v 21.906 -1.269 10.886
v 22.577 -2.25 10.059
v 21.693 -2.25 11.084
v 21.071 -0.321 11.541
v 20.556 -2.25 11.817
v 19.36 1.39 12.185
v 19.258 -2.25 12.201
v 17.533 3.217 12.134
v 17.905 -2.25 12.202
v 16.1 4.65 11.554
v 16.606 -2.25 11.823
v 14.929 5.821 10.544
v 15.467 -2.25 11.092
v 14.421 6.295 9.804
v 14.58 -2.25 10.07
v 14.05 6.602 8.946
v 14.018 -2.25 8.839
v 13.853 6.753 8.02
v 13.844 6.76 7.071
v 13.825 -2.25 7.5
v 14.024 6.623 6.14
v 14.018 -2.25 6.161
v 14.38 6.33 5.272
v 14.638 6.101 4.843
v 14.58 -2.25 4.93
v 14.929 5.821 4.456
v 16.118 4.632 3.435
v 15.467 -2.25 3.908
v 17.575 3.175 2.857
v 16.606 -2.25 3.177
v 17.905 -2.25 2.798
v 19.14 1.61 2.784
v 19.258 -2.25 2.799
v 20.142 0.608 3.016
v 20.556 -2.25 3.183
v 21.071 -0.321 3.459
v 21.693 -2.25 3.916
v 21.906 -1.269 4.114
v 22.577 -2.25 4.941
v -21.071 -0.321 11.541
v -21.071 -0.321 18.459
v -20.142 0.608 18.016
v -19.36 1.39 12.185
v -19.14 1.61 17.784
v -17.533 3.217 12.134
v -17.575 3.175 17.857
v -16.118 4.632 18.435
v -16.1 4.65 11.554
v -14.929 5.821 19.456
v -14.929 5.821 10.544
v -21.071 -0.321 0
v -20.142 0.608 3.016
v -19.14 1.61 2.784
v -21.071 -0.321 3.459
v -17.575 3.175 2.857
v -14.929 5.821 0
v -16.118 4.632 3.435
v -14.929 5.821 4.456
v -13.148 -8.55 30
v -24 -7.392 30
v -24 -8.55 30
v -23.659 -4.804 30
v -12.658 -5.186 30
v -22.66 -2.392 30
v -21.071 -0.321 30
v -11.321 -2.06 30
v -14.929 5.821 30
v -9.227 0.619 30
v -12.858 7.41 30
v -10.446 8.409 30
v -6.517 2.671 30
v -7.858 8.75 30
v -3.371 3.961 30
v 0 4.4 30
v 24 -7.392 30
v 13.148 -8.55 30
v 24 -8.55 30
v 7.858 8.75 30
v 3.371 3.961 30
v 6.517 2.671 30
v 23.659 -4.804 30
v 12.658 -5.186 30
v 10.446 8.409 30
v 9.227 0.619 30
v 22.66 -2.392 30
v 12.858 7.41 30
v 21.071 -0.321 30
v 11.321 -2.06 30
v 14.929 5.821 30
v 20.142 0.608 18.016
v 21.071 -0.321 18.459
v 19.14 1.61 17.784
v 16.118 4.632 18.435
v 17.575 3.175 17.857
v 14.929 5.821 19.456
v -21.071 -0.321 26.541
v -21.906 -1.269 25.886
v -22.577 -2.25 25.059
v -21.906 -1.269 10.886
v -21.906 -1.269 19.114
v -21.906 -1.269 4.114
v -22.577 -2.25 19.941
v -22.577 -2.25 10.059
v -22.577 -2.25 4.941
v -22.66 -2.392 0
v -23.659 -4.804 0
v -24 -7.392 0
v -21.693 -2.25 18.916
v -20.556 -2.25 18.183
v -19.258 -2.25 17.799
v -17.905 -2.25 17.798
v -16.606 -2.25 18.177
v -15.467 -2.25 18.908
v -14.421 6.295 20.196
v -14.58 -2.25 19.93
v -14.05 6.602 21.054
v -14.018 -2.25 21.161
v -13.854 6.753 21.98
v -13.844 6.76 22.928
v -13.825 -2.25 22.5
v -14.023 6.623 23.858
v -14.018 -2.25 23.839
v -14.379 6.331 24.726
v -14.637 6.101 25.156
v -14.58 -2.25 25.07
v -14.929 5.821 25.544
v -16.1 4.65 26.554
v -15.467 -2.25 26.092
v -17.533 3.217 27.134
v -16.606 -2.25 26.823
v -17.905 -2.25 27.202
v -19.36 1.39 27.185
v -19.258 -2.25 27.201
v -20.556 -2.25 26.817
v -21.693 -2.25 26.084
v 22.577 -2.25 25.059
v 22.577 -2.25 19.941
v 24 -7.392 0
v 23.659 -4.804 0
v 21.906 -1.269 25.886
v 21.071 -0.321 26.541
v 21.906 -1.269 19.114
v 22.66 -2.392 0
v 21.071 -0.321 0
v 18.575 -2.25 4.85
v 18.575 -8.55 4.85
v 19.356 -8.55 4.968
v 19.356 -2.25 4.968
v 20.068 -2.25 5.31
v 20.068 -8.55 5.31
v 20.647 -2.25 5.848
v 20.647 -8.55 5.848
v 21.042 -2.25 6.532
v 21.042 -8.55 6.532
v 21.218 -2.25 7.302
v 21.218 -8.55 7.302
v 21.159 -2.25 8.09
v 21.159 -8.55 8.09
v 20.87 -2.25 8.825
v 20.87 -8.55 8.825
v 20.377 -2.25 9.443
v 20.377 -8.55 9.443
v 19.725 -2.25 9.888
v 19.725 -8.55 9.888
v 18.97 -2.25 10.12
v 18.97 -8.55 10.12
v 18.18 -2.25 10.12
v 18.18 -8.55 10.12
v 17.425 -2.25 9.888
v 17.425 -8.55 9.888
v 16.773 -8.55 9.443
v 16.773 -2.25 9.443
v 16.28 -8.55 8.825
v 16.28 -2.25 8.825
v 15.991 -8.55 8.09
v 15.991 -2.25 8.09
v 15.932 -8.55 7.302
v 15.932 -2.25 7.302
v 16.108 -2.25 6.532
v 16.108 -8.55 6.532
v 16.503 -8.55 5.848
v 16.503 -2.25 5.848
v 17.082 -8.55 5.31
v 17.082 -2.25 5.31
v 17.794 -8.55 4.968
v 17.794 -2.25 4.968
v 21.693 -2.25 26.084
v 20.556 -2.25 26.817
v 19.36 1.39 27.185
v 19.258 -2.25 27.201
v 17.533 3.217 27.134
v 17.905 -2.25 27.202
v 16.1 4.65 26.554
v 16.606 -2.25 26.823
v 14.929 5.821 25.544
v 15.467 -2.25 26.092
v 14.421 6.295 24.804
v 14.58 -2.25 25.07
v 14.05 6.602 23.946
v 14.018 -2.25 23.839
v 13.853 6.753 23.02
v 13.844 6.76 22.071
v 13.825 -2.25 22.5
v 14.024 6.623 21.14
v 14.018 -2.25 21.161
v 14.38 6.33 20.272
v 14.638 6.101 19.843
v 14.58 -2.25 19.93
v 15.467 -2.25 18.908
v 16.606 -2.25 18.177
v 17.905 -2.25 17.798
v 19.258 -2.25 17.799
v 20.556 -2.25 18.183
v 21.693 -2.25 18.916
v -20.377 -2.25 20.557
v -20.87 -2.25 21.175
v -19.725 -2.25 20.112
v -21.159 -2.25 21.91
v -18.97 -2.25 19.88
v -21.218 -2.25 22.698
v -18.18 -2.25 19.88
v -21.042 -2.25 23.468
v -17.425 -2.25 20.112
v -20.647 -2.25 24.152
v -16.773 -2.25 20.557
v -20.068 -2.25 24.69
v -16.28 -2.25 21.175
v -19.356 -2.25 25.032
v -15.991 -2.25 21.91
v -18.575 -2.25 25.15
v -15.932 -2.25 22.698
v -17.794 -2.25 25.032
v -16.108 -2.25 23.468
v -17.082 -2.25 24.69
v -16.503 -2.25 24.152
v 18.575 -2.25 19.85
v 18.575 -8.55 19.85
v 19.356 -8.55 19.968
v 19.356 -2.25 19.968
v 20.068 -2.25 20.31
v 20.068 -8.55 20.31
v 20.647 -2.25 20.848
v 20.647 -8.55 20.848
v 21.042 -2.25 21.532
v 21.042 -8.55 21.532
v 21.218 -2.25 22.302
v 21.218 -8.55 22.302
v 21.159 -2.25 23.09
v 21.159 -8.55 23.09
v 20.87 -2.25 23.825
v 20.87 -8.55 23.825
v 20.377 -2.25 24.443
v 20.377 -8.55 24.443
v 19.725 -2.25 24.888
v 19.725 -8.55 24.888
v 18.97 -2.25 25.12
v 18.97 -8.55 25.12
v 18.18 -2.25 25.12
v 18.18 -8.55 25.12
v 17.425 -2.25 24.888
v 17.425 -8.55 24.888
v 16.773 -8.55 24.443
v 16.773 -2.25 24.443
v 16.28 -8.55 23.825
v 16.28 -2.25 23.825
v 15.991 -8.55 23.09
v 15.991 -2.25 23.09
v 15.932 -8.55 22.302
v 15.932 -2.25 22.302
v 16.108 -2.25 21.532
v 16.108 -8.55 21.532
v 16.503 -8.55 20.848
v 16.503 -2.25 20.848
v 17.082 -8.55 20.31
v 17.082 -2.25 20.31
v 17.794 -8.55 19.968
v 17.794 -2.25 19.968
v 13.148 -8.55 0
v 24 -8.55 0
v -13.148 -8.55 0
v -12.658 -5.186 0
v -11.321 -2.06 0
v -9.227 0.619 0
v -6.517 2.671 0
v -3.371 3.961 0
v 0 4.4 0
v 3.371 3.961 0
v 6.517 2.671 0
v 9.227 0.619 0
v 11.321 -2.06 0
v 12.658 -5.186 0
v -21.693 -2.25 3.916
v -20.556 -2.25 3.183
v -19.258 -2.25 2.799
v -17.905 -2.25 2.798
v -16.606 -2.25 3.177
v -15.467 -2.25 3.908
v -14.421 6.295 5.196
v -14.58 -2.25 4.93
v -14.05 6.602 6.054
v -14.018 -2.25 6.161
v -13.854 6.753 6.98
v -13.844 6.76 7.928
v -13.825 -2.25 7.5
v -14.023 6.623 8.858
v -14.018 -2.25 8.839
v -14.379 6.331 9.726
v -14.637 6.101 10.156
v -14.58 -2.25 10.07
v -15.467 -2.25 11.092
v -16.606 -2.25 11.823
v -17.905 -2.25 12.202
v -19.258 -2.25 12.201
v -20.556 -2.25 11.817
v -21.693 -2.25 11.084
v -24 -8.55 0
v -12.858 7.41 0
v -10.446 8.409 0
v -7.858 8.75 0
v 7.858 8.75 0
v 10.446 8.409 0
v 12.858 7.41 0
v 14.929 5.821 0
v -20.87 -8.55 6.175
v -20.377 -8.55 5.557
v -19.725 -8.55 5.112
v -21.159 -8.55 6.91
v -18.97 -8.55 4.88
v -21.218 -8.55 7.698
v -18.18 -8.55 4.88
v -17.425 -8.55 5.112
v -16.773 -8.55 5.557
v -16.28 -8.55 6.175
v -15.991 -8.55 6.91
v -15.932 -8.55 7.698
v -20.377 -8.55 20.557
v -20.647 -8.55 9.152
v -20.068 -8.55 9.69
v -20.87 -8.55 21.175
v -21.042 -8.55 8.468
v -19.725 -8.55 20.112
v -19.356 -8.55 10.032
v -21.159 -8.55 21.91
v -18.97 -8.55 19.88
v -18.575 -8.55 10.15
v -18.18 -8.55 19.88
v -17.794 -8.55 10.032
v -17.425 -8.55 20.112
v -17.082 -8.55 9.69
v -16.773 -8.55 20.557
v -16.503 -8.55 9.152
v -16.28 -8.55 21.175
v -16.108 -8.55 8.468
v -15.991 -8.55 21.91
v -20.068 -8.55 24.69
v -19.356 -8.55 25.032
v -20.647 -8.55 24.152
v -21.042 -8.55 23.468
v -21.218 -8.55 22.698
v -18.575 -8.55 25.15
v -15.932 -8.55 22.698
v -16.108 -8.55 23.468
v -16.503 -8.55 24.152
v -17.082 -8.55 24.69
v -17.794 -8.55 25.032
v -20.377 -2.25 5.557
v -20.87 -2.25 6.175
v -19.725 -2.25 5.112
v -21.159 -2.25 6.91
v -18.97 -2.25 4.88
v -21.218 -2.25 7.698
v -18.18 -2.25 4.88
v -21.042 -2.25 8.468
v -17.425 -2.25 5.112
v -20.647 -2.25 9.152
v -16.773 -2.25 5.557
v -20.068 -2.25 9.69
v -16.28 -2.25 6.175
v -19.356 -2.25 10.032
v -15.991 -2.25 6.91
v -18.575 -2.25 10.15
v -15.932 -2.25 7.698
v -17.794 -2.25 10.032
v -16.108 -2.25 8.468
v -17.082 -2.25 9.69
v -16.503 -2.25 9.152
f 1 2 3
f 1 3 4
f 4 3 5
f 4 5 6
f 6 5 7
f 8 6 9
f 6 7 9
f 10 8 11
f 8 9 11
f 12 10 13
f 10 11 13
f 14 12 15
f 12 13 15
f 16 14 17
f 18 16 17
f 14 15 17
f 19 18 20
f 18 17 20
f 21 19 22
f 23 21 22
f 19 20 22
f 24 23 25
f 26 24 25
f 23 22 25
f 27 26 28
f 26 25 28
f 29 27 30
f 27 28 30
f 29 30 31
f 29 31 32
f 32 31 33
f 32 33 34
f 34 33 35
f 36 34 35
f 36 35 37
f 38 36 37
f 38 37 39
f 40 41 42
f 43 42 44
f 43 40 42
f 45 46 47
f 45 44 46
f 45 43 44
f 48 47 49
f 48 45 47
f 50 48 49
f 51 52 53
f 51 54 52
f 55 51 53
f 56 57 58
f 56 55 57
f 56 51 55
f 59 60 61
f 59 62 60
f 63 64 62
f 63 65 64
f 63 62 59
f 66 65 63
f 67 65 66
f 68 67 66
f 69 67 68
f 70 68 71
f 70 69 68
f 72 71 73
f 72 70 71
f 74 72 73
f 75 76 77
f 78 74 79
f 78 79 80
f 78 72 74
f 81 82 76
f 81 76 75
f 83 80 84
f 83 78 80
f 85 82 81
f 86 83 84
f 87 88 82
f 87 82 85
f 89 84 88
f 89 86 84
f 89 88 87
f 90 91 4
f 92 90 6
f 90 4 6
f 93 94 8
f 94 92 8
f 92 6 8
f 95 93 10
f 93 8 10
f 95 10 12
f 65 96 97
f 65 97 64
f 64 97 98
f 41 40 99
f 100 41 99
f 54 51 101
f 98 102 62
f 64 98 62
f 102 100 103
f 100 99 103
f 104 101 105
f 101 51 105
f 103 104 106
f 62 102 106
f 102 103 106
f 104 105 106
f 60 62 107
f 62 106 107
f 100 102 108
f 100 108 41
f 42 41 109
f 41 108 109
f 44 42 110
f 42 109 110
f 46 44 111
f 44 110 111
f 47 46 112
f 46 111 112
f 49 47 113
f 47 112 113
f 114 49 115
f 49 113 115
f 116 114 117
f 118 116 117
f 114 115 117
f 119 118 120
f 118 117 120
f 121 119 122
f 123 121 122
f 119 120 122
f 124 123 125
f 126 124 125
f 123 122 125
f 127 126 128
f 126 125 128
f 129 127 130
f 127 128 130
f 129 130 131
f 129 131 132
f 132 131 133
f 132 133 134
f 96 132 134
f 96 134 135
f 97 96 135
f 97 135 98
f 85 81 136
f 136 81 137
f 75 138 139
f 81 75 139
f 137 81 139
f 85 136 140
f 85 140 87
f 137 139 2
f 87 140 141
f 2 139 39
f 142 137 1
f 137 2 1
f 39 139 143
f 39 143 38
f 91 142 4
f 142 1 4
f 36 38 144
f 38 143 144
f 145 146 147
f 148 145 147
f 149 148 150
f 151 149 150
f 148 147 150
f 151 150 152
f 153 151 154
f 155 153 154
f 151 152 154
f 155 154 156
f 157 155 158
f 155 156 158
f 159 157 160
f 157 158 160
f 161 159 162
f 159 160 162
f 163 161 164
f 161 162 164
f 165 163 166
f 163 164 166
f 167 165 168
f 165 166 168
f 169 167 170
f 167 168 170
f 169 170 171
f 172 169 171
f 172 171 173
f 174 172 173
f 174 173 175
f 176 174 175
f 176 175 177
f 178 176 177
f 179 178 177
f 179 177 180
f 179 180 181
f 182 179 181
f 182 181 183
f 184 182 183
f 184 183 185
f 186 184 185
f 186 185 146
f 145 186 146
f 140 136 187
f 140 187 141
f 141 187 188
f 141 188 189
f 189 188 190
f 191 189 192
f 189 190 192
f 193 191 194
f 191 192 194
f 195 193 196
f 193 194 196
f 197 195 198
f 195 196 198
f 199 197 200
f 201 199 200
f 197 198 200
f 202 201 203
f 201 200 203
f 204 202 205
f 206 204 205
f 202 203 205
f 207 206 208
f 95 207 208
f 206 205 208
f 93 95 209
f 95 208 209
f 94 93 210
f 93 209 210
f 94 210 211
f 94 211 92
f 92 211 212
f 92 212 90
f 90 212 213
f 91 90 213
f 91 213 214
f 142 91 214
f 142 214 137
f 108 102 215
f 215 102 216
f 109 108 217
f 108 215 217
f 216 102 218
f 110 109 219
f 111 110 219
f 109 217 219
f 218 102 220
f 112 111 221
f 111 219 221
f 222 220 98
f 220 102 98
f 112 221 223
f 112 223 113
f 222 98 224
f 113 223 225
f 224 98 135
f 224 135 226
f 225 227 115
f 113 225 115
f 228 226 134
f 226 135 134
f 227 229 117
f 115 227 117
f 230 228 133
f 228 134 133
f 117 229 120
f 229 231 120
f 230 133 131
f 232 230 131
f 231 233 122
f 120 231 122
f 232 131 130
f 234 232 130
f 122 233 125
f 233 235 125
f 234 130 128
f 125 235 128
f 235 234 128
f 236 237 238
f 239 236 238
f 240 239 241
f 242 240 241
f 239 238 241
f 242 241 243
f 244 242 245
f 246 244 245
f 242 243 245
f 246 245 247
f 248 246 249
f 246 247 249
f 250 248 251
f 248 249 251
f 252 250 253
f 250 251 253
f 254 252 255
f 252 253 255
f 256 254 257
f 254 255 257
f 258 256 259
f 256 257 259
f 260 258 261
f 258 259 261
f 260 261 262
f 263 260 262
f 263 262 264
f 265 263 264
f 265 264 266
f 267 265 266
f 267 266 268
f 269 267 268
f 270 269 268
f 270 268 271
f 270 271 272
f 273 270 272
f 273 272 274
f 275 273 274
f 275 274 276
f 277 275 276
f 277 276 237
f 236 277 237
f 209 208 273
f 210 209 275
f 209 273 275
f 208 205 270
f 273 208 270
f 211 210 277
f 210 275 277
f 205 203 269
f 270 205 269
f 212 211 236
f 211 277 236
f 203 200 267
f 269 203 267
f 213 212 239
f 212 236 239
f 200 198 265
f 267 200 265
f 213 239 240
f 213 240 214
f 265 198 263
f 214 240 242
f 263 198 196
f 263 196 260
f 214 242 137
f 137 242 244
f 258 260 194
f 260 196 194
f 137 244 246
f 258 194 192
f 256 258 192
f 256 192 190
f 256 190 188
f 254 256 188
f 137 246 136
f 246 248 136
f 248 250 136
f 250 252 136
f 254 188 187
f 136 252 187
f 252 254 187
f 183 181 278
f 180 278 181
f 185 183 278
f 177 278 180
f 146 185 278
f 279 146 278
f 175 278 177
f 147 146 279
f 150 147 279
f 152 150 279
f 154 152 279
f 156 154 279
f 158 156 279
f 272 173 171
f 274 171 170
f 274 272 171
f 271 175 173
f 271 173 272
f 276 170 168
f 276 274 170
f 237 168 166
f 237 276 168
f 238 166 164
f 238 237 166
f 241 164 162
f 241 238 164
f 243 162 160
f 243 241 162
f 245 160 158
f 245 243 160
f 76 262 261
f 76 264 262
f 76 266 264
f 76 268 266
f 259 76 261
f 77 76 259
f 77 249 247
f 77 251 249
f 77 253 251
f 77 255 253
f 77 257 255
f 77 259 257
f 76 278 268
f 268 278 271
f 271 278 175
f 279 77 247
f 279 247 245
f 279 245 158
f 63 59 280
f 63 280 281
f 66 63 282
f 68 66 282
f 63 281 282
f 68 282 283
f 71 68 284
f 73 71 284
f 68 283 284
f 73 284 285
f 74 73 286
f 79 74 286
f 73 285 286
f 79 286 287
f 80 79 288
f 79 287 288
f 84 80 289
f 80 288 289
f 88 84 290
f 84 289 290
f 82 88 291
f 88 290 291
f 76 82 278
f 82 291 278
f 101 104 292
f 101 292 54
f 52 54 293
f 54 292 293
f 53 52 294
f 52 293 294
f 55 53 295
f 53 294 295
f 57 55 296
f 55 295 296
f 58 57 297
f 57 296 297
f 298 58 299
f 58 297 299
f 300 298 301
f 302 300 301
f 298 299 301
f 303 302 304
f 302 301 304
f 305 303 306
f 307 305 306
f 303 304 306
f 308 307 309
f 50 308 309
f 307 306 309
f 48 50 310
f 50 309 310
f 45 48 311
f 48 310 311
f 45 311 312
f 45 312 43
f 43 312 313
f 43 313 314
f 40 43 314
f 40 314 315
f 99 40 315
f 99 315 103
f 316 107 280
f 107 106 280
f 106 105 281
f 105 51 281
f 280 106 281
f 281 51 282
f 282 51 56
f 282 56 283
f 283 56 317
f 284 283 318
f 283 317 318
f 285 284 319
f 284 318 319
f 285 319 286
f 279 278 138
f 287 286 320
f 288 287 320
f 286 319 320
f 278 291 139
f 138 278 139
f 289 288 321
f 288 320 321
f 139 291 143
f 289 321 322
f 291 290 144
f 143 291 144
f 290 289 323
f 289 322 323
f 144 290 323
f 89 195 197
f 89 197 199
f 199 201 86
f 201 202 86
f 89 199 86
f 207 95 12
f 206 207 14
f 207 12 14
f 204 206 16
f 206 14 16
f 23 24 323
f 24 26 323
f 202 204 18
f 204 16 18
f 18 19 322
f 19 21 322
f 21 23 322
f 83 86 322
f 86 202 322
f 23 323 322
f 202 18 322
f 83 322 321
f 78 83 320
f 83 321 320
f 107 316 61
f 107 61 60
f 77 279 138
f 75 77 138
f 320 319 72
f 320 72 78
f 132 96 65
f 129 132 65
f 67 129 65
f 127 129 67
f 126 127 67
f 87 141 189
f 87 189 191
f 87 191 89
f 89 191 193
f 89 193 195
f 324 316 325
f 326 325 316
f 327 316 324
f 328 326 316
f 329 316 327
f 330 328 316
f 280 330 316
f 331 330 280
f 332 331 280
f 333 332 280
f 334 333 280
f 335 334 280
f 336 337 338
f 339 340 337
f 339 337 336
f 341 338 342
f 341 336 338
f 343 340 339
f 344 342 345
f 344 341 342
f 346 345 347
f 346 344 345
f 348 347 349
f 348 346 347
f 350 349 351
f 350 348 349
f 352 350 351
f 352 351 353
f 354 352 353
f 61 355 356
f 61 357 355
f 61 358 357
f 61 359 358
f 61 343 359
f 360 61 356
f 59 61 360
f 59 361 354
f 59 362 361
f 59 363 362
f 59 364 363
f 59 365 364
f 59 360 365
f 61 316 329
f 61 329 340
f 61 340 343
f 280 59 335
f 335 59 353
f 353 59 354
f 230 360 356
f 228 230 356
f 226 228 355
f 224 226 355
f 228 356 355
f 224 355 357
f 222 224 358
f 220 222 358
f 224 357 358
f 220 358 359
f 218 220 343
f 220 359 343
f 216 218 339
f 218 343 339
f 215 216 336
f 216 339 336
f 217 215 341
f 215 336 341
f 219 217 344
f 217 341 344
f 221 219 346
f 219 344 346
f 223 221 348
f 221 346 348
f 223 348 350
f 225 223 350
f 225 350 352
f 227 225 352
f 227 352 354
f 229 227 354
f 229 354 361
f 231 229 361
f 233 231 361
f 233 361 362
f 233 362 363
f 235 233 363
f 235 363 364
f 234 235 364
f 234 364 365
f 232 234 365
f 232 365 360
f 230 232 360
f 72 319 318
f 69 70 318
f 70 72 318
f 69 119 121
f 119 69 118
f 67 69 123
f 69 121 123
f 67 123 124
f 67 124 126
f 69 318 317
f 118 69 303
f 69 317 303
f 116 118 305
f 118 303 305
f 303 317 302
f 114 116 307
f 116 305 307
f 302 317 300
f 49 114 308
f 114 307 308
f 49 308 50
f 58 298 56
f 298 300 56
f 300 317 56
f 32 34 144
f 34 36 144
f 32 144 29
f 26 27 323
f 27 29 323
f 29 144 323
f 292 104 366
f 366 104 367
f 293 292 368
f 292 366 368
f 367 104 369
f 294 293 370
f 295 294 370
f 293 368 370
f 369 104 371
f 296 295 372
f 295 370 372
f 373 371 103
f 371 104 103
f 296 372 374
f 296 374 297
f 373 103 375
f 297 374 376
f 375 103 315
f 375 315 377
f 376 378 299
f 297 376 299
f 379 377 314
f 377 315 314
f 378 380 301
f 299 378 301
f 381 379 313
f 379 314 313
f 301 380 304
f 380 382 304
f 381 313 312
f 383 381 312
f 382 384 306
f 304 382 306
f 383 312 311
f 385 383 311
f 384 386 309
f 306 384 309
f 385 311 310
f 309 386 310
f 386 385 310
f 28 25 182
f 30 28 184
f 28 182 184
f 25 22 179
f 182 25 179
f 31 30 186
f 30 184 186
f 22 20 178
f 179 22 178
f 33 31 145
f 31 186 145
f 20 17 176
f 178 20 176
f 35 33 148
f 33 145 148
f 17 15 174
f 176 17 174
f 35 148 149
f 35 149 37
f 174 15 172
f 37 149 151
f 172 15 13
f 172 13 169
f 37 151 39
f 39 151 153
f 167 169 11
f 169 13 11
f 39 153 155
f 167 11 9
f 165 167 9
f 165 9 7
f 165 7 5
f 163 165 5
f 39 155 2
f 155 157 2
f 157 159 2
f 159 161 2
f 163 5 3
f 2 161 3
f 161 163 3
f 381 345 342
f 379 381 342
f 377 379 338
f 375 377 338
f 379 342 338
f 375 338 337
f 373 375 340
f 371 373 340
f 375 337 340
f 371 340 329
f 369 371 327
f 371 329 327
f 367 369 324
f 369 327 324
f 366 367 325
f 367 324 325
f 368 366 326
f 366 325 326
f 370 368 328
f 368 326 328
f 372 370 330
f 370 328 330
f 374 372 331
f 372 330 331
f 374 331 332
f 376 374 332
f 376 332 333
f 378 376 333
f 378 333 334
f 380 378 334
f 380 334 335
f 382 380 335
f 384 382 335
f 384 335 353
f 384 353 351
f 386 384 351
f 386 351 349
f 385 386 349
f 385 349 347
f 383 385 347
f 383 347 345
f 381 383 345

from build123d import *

# Parameters (mm, degrees)
SKETCH1_W              = 48
SKETCH1_H              = 17.5
BODY_DEPTH             = 30
TUBE_CUTOUT_DEPTH      = 40.402569713
SKETCH3_R              = 2.65
CUT_EXTRUDE_M5_DEPTH   = 43.216702856
SLOPE_DEPTH            = 40.402569713
BOLT_HEAD_CUTOUT_START = -6.5
SKETCH5_R              = 4.75
BOLT_HEAD_CUTOUT_DEPTH = 23
FILLET_2_R             = 10
SKETCH7_W              = 48
SKETCH7_H              = 30
CLEARANCE_DEPTH        = 0.2


with BuildPart() as part:
    # Sketch1 → body (new body)
    with BuildSketch(Plane.XY):
        Rectangle(SKETCH1_W, SKETCH1_H)
    extrude(amount=BODY_DEPTH)

    # Sketch2 → tube_cutout (cut, through all)
    with BuildSketch(Plane.XY):
        with BuildLine():
            Line((13.15, -8.75), (-13.15, -8.75))
            ThreePointArc((-13.15, -8.75), (0, 4.4), (13.15, -8.75))
        make_face()
    extrude(amount=TUBE_CUTOUT_DEPTH, mode=Mode.SUBTRACT)

    # Sketch3 → Cut-Extrude M5 (cut, through all)
    with BuildSketch(Plane.XZ.offset(8.75)):
        with Locations(Location((18.575, 22.5, 0), (0, 0, 270))):
            Circle(SKETCH3_R)
        with Locations(Location((18.575, 7.5, 0), (0, 0, 270))):
            Circle(SKETCH3_R)
        with Locations(Location((-18.575, 7.5, 0), (0, 0, 90))):
            Circle(SKETCH3_R)
        with Locations(Location((-18.575, 22.5, 0), (0, 0, 90))):
            Circle(SKETCH3_R)
    extrude(amount=-CUT_EXTRUDE_M5_DEPTH, mode=Mode.SUBTRACT)

    # Sketch4 → slope (cut, through all)
    with BuildSketch(Plane.XY):
        Polygon((-24, 8.75), (-24, -3.25), (-12, 8.75), align=None)
        Polygon((24, -3.25), (12, 8.75), (24, 8.75), align=None)
    extrude(amount=SLOPE_DEPTH, mode=Mode.SUBTRACT)

    # Sketch5 → bolt_head_cutout (cut)
    with BuildSketch(Plane.XZ.offset(8.75).offset(BOLT_HEAD_CUTOUT_START)):
        with Locations((18.575, 22.5)):
            Circle(SKETCH5_R)
        with Locations((18.575, 7.5)):
            Circle(SKETCH5_R)
        with Locations((-18.575, 7.5)):
            Circle(SKETCH5_R)
        with Locations((-18.575, 22.5)):
            Circle(SKETCH5_R)
    extrude(amount=-BOLT_HEAD_CUTOUT_DEPTH, mode=Mode.SUBTRACT)

    # fillet 2
    # the kernel refuses this fillet: 10 mm, written as the material it takes off along each edge
    with BuildSketch(Plane(origin=(24, -3.25, -10.355339059), x_dir=(-0.7071067811865475, 0.7071067811865478, 0), z_dir=(0, 0, 1)), Plane(origin=(12, 8.75, -10.355339059), x_dir=(-1, 0, 0), z_dir=(0, 0, 1)), Plane(origin=(-12, 8.75, -10.355339059), x_dir=(-0.7071067811865474, -0.7071067811865478, 0), z_dir=(0, 0, 1))) as fillet_2_piece_1:
        with BuildLine():
            CenterArc((FILLET_2_R * 0.414213562373, FILLET_2_R), FILLET_2_R, 225, 45)
            Line((-FILLET_2_R * 0.292893218813, FILLET_2_R * 0.292893218813), (0, 0))
            Line((0, 0), (FILLET_2_R * 0.414213562373, 0))
        make_face()
    extrude(amount=50.710678119, mode=Mode.SUBTRACT)
    with BuildSketch(Plane(origin=(-24, -3.25, -10.355339059), x_dir=(0.7071067811865469, 0.707106781186548, 0), z_dir=(0, 0, 1))) as fillet_2_piece_2:
        with BuildLine():
            CenterArc((FILLET_2_R * 0.414213562373, -FILLET_2_R), FILLET_2_R, 90, 45)
            Line((-FILLET_2_R * 0.292893218813, -FILLET_2_R * 0.292893218813), (0, 0))
            Line((0, 0), (FILLET_2_R * 0.414213562373, 0))
        make_face()
    extrude(amount=50.710678119, mode=Mode.SUBTRACT)

    # Sketch7 → clearance (cut)
    with BuildSketch(Plane.XZ.offset(8.75)):
        with Locations((0, 15)):
            Rectangle(SKETCH7_W, SKETCH7_H)
    extrude(amount=-CLEARANCE_DEPTH, mode=Mode.SUBTRACT)


solid = part.part
